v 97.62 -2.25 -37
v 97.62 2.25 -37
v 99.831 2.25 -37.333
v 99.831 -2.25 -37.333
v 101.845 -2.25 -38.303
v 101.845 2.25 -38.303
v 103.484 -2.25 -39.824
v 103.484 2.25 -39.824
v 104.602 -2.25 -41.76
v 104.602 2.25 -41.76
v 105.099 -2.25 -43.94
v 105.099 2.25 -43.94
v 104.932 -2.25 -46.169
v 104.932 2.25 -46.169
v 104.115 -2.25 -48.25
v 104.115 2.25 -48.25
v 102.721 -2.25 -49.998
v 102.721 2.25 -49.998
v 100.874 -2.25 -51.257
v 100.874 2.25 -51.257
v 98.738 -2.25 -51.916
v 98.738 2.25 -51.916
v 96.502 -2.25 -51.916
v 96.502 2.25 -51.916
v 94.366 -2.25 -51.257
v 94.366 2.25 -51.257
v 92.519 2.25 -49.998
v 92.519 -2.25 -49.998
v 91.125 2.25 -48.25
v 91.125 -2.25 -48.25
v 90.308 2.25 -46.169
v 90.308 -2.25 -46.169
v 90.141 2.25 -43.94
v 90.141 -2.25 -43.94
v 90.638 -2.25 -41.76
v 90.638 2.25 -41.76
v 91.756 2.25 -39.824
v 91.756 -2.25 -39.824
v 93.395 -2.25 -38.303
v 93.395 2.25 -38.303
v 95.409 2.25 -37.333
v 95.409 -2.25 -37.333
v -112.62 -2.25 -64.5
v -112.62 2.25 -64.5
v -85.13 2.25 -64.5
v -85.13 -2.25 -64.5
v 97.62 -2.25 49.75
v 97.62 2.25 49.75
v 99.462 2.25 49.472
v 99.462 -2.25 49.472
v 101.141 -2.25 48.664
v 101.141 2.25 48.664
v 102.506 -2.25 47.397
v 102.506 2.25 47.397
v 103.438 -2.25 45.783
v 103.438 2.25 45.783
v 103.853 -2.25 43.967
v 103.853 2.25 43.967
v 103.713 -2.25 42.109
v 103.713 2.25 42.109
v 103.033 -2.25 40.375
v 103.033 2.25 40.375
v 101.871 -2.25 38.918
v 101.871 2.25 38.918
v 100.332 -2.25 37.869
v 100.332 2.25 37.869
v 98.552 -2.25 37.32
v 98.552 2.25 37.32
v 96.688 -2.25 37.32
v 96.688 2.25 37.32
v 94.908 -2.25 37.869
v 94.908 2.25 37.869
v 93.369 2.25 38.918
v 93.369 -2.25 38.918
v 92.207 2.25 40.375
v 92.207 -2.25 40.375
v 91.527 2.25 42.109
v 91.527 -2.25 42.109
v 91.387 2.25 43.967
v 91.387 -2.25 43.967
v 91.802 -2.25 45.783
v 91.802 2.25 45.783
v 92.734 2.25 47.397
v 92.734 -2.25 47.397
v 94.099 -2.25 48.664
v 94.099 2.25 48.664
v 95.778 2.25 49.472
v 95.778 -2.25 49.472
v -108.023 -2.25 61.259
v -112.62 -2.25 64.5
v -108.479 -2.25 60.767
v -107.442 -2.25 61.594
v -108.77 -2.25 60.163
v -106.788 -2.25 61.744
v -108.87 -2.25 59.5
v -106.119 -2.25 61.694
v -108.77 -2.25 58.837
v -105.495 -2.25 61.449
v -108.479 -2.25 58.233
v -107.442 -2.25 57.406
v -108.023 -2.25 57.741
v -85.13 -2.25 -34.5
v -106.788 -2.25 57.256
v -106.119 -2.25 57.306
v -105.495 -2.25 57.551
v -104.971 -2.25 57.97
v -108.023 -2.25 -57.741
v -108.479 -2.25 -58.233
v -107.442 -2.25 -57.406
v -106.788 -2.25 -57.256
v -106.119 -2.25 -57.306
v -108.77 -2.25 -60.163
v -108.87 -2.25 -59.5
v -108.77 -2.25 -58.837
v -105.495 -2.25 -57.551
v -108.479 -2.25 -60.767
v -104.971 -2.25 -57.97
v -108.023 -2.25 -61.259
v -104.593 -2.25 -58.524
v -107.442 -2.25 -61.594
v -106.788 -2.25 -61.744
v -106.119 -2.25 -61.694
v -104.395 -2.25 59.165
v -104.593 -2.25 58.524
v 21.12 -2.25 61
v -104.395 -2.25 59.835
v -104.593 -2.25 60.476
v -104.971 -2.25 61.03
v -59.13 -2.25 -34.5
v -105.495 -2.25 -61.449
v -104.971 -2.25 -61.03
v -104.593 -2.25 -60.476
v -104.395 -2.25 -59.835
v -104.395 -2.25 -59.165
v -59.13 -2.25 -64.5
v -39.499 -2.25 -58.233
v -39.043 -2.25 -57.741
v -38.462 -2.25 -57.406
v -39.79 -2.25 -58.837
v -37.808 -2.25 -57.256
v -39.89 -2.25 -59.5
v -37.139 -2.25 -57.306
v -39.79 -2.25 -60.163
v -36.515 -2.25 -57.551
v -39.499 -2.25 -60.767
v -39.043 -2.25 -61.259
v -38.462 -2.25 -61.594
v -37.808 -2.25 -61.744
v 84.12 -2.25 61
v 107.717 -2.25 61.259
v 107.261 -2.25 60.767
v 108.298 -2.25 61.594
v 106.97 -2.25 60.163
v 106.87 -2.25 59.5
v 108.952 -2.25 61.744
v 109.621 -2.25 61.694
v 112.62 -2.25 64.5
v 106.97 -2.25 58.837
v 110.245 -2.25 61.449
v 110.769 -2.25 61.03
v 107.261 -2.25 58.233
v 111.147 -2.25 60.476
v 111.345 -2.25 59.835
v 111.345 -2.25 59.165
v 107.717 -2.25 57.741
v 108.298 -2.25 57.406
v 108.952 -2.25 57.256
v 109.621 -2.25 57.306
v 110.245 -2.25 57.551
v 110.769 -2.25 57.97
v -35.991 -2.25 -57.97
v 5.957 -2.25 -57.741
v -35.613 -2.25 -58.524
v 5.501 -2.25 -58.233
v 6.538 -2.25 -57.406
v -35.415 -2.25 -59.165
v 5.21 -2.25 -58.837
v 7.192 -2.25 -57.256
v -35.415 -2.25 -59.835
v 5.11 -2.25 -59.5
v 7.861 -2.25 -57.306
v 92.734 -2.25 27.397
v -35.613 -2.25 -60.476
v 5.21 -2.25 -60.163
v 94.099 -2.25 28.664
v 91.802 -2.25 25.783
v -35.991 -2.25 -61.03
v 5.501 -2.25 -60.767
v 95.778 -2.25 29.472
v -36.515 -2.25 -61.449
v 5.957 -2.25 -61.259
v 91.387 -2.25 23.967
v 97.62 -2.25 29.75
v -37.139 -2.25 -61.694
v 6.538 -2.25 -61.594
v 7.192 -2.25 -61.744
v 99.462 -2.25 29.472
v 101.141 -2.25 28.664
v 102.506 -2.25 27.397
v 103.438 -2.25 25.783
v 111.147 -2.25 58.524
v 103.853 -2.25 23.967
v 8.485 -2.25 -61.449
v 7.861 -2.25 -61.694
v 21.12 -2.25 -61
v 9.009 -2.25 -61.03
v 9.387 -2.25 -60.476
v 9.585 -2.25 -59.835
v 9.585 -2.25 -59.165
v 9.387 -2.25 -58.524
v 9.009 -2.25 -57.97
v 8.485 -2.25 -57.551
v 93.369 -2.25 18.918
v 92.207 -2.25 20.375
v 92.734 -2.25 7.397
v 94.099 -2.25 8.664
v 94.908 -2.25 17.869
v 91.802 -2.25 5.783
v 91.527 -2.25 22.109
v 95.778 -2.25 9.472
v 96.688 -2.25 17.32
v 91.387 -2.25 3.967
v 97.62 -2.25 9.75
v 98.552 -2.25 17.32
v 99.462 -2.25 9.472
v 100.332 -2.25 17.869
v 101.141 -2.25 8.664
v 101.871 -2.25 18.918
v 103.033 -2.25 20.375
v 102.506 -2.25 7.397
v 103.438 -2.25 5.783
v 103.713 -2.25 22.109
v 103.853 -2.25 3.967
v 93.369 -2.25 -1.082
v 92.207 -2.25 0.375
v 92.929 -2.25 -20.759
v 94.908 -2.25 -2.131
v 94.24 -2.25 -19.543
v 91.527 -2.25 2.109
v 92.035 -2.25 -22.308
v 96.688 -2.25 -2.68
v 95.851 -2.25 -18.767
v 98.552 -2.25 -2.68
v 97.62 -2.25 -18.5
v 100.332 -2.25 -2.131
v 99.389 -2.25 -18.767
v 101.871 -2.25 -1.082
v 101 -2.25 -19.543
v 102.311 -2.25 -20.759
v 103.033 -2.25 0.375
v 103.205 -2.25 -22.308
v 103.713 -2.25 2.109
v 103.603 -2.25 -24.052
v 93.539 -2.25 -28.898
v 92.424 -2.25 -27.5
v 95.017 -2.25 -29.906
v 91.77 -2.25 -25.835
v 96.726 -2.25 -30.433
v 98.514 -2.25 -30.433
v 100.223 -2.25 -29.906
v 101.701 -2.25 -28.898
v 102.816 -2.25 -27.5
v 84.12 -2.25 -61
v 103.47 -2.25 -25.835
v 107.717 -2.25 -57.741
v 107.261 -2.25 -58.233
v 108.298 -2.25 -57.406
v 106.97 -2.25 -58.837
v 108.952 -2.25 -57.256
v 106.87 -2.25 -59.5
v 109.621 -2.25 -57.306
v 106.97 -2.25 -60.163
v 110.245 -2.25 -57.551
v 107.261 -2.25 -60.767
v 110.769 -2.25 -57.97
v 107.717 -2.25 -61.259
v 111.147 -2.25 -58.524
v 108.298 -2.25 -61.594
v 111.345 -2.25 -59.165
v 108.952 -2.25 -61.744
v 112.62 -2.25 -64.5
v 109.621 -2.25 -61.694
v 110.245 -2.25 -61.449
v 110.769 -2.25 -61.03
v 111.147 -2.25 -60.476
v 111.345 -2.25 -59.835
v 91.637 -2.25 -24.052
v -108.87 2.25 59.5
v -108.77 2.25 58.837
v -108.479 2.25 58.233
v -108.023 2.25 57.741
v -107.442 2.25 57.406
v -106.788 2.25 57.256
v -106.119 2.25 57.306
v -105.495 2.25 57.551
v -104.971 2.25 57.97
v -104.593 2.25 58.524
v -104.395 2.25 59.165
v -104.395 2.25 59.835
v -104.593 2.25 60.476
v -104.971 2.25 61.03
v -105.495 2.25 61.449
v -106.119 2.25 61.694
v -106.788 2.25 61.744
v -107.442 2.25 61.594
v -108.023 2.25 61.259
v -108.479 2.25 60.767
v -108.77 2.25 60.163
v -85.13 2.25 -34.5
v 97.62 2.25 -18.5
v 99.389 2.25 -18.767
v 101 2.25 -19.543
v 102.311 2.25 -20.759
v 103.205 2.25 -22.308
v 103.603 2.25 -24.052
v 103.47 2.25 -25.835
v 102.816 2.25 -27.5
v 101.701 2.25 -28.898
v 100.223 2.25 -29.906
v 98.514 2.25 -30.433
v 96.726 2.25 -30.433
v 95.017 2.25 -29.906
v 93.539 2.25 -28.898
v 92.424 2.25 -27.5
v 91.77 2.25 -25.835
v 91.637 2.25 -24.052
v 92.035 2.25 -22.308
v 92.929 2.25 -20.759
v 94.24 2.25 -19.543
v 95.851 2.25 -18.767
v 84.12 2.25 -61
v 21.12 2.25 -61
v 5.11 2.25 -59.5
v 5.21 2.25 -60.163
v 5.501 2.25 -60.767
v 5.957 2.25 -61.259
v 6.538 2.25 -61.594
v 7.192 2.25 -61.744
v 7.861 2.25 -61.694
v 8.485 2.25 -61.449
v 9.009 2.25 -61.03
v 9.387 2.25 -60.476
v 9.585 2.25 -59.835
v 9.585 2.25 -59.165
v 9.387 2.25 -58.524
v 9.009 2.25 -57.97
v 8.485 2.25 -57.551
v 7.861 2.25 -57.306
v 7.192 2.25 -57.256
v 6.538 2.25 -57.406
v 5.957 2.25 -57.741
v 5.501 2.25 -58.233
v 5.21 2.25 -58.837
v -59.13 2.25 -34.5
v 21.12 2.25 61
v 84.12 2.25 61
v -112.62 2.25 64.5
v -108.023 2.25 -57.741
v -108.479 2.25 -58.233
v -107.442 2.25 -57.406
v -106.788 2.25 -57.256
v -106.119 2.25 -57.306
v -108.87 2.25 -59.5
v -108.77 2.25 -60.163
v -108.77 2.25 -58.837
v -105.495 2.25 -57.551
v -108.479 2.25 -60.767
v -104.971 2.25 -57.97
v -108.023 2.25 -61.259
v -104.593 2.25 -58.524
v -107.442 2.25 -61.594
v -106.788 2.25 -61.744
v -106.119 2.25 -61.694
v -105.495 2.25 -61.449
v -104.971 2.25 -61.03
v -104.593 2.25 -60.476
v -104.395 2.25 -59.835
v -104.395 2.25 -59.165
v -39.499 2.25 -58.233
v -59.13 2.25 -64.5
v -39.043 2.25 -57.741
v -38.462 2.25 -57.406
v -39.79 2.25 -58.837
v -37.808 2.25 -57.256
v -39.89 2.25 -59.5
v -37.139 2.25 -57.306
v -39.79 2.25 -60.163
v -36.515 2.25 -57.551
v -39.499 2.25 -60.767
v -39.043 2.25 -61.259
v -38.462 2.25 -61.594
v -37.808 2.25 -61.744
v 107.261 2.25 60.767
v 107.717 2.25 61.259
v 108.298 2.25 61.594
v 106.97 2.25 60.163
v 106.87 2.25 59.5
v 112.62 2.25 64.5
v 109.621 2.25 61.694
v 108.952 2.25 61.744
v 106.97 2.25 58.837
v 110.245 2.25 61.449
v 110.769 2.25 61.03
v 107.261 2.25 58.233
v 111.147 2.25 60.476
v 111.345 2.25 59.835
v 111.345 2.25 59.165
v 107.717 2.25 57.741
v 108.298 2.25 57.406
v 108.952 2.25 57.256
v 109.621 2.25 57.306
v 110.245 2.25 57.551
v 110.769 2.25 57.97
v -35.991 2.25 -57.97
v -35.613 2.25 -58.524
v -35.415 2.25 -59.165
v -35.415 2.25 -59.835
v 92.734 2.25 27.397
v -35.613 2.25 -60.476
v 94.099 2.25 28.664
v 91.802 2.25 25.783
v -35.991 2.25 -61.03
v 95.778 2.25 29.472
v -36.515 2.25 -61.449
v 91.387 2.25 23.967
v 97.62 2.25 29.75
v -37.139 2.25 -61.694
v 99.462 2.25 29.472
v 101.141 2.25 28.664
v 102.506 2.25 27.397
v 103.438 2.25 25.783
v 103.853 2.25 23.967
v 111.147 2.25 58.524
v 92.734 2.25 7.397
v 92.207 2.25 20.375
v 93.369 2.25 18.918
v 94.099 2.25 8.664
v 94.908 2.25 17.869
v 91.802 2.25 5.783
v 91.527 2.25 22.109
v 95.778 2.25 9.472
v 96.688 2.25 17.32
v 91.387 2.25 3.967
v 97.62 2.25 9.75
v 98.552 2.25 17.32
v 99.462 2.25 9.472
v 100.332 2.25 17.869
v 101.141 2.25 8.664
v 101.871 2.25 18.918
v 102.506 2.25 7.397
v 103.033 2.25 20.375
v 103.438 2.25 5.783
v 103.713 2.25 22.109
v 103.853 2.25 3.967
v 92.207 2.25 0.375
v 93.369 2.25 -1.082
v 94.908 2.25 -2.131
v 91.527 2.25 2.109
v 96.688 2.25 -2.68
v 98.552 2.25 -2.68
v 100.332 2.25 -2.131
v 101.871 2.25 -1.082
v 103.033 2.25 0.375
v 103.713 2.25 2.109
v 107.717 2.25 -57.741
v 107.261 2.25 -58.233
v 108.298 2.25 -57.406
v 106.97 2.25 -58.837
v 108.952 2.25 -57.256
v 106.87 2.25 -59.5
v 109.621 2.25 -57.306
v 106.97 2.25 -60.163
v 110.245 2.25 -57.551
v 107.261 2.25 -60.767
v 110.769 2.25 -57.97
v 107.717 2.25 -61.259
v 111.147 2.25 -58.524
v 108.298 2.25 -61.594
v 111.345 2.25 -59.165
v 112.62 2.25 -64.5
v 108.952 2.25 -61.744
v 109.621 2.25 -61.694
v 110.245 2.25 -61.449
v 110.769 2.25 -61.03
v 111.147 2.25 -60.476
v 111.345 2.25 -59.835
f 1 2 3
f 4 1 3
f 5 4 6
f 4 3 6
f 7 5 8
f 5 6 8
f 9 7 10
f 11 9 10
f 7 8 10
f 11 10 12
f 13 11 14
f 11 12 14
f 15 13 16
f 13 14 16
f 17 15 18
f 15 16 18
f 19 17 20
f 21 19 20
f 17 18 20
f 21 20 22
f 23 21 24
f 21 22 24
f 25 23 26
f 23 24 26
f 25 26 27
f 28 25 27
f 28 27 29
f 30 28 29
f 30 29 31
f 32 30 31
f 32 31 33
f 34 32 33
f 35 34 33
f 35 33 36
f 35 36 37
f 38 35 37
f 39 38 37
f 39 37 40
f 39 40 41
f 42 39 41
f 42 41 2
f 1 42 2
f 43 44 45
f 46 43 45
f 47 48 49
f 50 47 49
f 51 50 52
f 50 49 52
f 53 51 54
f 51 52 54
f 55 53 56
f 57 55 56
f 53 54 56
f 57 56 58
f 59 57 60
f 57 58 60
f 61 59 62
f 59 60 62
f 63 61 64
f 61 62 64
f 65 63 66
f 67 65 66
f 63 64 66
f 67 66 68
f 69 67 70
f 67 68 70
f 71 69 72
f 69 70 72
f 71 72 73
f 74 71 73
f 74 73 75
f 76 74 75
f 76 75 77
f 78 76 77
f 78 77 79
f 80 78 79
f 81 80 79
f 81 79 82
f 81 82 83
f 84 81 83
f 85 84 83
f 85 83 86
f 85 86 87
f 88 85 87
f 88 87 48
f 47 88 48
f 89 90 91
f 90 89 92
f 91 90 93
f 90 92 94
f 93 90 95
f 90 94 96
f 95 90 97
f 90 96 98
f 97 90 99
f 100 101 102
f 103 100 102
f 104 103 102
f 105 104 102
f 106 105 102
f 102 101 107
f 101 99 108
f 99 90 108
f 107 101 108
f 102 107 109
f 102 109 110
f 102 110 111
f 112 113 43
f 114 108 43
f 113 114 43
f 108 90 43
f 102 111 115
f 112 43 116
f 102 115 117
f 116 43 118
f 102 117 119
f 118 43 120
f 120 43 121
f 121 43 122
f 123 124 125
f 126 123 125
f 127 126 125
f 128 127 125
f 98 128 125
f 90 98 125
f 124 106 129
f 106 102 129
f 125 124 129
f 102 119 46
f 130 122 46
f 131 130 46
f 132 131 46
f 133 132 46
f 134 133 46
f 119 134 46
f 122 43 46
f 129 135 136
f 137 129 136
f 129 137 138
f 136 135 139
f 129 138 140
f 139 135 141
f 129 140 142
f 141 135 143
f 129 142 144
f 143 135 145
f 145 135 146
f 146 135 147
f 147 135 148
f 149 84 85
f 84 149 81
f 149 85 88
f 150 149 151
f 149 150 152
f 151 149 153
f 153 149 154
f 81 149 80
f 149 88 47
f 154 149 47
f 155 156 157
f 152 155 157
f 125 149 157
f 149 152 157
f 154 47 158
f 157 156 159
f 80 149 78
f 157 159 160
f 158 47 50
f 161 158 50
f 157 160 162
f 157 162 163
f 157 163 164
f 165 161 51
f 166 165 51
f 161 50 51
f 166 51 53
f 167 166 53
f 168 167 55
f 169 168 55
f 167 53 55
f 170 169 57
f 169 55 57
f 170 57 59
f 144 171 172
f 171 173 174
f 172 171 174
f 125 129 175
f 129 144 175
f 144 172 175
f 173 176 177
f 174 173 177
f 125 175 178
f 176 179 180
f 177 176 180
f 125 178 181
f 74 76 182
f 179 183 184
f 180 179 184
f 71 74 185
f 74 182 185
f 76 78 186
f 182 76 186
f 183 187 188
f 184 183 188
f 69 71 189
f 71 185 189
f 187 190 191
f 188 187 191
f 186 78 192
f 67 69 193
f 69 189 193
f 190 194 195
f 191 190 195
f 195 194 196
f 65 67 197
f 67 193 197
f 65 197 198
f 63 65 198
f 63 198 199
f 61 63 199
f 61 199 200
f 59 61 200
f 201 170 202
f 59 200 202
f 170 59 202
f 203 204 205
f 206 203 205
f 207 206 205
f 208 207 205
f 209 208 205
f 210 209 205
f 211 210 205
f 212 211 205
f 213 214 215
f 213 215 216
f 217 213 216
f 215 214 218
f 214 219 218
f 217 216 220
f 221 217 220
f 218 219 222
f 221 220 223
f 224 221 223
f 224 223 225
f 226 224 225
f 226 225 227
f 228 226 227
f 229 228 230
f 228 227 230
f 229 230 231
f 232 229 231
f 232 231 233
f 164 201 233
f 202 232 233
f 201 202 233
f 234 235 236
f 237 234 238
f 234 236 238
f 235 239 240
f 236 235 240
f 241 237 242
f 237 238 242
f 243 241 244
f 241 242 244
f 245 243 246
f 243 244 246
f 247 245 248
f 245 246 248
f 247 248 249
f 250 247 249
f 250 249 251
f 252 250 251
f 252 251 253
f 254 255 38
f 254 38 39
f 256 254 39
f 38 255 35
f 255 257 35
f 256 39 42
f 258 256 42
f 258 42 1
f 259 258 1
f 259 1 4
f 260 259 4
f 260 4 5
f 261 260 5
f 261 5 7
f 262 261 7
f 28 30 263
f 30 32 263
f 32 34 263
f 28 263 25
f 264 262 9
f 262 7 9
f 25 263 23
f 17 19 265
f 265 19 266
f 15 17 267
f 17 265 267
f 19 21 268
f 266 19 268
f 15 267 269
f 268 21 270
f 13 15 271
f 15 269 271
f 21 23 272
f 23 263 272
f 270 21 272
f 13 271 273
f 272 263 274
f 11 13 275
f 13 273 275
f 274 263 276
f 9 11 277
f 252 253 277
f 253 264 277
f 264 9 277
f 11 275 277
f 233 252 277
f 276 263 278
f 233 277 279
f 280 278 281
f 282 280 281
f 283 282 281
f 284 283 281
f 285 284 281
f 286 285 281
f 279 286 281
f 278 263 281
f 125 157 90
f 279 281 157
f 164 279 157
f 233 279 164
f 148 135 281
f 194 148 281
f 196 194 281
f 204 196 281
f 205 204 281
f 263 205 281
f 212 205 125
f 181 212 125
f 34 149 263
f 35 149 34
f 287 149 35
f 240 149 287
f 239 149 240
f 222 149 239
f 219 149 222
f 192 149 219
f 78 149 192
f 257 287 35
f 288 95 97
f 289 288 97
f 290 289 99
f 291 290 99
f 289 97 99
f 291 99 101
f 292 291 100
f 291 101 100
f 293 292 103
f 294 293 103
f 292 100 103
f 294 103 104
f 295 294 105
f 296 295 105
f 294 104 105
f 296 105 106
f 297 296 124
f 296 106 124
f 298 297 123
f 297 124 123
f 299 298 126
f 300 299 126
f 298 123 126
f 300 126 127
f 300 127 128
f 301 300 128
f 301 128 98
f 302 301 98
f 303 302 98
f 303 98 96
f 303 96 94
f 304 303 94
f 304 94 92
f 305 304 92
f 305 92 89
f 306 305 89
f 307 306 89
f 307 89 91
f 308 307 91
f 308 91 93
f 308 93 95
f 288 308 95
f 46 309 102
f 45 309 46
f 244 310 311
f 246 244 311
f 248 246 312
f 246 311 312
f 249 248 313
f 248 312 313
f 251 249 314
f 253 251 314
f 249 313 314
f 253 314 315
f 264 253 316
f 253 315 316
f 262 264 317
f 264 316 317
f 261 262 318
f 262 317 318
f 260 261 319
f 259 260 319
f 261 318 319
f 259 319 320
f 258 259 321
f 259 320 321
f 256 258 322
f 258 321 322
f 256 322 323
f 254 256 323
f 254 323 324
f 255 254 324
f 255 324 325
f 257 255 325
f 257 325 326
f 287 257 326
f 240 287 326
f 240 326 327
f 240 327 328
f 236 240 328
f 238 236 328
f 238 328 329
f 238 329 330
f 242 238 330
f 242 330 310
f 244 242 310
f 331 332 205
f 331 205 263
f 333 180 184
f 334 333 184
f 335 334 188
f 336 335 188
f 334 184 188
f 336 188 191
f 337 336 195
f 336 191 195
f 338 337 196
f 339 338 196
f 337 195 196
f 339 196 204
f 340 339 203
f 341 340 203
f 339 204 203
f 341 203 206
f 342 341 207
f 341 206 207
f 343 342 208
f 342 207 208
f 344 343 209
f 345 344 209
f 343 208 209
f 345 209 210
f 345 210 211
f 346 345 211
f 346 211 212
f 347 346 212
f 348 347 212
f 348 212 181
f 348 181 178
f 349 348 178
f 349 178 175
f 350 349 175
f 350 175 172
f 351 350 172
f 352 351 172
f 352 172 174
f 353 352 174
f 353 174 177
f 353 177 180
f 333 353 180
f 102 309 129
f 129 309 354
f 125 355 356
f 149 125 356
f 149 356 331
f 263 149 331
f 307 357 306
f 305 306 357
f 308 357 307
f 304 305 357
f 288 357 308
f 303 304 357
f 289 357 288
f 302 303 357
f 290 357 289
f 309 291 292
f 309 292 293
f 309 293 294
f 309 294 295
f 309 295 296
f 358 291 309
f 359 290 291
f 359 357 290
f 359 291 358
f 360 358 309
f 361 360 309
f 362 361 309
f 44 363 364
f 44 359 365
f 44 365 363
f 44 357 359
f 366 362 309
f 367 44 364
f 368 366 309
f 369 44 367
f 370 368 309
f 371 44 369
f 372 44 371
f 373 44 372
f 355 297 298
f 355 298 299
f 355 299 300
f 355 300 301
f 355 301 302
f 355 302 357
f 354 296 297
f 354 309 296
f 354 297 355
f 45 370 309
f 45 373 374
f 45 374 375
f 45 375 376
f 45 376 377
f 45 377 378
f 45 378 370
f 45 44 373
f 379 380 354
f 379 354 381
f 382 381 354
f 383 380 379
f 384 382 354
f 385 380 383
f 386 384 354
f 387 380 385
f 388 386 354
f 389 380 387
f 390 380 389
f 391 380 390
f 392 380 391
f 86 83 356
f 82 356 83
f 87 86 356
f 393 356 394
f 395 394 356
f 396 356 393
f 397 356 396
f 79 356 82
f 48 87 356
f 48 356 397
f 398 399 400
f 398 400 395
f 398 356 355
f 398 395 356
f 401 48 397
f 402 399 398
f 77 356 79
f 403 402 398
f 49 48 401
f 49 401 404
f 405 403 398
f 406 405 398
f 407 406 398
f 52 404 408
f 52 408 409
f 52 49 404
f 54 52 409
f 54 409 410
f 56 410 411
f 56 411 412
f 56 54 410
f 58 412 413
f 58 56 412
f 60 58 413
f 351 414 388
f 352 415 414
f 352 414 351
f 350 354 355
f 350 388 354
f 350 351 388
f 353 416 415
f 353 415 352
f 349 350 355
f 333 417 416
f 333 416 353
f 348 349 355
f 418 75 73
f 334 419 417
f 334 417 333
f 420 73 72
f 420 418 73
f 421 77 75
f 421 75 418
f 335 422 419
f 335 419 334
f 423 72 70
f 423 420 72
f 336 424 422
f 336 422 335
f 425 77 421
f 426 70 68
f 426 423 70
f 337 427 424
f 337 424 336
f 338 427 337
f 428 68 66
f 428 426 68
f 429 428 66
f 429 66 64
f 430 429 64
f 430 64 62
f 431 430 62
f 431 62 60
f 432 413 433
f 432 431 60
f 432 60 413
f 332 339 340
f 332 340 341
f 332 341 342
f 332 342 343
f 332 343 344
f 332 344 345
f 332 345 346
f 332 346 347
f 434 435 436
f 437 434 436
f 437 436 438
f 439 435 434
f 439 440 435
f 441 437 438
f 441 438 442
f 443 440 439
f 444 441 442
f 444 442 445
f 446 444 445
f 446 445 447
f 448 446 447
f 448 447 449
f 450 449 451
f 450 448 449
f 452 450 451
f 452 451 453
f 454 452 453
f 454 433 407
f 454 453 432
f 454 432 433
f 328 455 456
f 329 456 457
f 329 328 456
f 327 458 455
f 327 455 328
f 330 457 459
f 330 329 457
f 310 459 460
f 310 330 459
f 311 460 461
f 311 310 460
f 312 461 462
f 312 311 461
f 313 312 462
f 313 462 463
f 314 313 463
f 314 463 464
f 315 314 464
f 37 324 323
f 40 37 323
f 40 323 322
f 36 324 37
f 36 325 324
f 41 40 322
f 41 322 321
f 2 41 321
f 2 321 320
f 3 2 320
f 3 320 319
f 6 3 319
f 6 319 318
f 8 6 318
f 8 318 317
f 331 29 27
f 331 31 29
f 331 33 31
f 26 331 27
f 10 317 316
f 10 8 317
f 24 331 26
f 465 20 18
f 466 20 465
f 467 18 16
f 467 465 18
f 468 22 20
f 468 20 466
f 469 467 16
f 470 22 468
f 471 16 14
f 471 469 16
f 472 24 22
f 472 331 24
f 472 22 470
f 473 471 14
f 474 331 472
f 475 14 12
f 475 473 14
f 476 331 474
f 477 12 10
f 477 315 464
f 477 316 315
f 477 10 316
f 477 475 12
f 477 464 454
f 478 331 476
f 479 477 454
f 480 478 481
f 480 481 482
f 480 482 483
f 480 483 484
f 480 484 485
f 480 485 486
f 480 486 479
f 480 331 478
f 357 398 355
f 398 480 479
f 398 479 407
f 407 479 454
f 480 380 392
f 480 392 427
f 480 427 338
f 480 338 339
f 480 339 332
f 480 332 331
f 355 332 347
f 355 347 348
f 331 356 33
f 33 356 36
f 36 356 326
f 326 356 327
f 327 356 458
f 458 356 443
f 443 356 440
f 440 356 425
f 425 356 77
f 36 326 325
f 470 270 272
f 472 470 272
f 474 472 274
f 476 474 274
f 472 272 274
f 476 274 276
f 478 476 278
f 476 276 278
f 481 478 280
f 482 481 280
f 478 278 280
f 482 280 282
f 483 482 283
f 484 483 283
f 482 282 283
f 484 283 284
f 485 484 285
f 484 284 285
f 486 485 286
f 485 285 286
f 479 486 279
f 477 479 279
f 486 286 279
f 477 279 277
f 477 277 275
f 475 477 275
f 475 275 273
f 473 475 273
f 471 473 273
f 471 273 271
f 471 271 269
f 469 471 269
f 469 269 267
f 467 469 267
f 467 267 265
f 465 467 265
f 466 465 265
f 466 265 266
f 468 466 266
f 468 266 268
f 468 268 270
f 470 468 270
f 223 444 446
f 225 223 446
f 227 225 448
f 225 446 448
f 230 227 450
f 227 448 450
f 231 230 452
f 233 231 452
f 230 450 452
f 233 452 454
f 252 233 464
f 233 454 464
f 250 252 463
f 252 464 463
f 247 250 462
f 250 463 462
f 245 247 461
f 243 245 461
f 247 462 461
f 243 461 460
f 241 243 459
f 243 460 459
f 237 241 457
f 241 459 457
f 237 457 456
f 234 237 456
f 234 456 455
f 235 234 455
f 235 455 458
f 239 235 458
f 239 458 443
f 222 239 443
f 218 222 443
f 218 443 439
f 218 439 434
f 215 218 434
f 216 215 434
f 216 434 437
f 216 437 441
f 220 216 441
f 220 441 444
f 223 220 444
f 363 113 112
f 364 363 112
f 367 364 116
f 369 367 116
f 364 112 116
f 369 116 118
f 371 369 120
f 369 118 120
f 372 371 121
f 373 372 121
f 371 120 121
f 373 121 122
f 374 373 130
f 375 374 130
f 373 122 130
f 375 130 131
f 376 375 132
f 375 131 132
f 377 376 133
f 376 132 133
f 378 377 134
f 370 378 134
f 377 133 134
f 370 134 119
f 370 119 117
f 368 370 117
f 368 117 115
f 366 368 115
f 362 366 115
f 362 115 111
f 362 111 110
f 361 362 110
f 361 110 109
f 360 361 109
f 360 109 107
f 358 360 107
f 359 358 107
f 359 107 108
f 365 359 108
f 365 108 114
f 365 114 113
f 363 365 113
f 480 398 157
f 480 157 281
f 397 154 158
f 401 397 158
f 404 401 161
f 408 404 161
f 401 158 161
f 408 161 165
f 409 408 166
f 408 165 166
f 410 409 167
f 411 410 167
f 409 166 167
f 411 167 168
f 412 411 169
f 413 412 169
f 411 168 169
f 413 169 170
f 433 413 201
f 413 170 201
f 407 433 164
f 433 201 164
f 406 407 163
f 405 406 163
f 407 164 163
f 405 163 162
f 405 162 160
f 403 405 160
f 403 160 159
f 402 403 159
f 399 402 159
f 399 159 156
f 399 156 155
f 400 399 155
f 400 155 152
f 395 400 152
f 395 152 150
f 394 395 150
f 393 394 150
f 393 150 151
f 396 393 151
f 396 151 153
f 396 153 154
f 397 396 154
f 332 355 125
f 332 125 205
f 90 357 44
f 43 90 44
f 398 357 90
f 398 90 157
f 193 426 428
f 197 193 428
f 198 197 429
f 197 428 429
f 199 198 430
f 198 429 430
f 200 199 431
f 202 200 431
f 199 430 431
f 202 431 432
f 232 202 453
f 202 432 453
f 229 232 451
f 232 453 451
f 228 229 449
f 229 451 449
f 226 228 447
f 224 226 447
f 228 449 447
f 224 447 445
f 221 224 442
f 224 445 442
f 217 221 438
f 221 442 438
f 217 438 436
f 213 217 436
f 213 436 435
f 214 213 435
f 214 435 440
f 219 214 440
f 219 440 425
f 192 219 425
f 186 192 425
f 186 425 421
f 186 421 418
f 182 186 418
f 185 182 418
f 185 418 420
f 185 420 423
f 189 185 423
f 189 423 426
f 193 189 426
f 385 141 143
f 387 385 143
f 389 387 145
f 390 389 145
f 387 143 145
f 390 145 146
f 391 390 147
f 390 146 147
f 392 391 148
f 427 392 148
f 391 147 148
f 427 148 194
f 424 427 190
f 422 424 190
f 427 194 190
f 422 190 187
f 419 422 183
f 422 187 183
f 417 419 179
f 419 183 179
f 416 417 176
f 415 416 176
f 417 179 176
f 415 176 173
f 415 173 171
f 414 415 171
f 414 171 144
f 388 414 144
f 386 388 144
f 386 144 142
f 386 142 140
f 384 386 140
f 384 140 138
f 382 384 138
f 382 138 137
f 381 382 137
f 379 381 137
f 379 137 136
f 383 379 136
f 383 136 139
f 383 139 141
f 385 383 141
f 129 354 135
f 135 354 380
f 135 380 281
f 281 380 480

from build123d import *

# Parameters (mm, degrees)
SKETCH1_W                = 225.24
SKETCH1_H                = 129
BOSS_EXTRUDE1_DEPTH      = 2.25
SKETCH2_W                = 63
SKETCH2_H                = 122
CUT_EXTRUDE1_DEPTH       = 130.860557522
SKETCH3_R                = 6.25
SKETCH3_R_2              = 6
SKETCH3_R_3              = 7.5
CUT_EXTRUDE2_DEPTH       = 130.860557522
SKETCH4_W                = 26
SKETCH4_H                = 30
CUT_EXTRUDE3_DEPTH       = 130.860557522
M4_CLEARANCE_HOLE1_D     = 4.5
M4_CLEARANCE_HOLE1_DEPTH = 12
M4_CLEARANCE_HOLE1_TIP   = 1.351936393


with BuildPart() as part:
    # Sketch1 → Boss-Extrude1 (new, symmetric)
    with BuildSketch(Plane(origin=(0, 0, 0), x_dir=(1, 0, 0), z_dir=(0, 1, 0))):
        Rectangle(SKETCH1_W, SKETCH1_H)
    extrude(amount=BOSS_EXTRUDE1_DEPTH, both=True)

    # Sketch2 → Cut-Extrude1 (cut, through all)
    with BuildSketch(Plane(origin=(0, 2.25, 0), x_dir=(1, 0, 0), z_dir=(0, 1, 0))):
        with Locations((52.62, 0)):
            Rectangle(SKETCH2_W, SKETCH2_H)
    extrude(amount=-CUT_EXTRUDE1_DEPTH, mode=Mode.SUBTRACT)

    # Sketch3 → Cut-Extrude2 (cut, through all)
    with BuildSketch(Plane(origin=(0, 2.25, 0), x_dir=(1, 0, 0), z_dir=(0, 1, 0))):
        with Locations(Location((97.62, -43.5, 0), (0, 0, 270))):
            Circle(SKETCH3_R)
        with Locations(Location((97.62, -23.5, 0), (0, 0, 270))):
            Circle(SKETCH3_R)
        with Locations(Location((97.62, -3.5, 0), (0, 0, 270))):
            Circle(SKETCH3_R)
        with Locations(Location((97.62, 24.5, 0), (0, 0, 270))):
            Circle(SKETCH3_R_2)
        with Locations(Location((97.62, 44.5, 0), (0, 0, 270))):
            Circle(SKETCH3_R_3)
    extrude(amount=-CUT_EXTRUDE2_DEPTH, mode=Mode.SUBTRACT)

    # Sketch4 → Cut-Extrude3 (cut, through all)
    with BuildSketch(Plane(origin=(0, 2.25, 0), x_dir=(1, 0, 0), z_dir=(0, 1, 0))):
        with Locations((-72.13, 49.5)):
            Rectangle(SKETCH4_W, SKETCH4_H)
    extrude(amount=-CUT_EXTRUDE3_DEPTH, mode=Mode.SUBTRACT)

    # M4 Clearance Hole1
    with Locations(Plane(origin=(0, 2.25, 0), x_dir=(1, 0, 0), z_dir=(0, 1, 0))):
        with Locations((-106.62, -59.5), (-106.62, 59.5), (-37.64, 59.5), (7.36, 59.5), (109.12, 59.5), (109.12, -59.5)):
            Hole(M4_CLEARANCE_HOLE1_D / 2, depth=M4_CLEARANCE_HOLE1_DEPTH)
            with Locations((0, 0, -(M4_CLEARANCE_HOLE1_DEPTH + M4_CLEARANCE_HOLE1_TIP / 2))):  # 118° drill point
                Cone(0, M4_CLEARANCE_HOLE1_D / 2, M4_CLEARANCE_HOLE1_TIP, mode=Mode.SUBTRACT)


solid = part.part
